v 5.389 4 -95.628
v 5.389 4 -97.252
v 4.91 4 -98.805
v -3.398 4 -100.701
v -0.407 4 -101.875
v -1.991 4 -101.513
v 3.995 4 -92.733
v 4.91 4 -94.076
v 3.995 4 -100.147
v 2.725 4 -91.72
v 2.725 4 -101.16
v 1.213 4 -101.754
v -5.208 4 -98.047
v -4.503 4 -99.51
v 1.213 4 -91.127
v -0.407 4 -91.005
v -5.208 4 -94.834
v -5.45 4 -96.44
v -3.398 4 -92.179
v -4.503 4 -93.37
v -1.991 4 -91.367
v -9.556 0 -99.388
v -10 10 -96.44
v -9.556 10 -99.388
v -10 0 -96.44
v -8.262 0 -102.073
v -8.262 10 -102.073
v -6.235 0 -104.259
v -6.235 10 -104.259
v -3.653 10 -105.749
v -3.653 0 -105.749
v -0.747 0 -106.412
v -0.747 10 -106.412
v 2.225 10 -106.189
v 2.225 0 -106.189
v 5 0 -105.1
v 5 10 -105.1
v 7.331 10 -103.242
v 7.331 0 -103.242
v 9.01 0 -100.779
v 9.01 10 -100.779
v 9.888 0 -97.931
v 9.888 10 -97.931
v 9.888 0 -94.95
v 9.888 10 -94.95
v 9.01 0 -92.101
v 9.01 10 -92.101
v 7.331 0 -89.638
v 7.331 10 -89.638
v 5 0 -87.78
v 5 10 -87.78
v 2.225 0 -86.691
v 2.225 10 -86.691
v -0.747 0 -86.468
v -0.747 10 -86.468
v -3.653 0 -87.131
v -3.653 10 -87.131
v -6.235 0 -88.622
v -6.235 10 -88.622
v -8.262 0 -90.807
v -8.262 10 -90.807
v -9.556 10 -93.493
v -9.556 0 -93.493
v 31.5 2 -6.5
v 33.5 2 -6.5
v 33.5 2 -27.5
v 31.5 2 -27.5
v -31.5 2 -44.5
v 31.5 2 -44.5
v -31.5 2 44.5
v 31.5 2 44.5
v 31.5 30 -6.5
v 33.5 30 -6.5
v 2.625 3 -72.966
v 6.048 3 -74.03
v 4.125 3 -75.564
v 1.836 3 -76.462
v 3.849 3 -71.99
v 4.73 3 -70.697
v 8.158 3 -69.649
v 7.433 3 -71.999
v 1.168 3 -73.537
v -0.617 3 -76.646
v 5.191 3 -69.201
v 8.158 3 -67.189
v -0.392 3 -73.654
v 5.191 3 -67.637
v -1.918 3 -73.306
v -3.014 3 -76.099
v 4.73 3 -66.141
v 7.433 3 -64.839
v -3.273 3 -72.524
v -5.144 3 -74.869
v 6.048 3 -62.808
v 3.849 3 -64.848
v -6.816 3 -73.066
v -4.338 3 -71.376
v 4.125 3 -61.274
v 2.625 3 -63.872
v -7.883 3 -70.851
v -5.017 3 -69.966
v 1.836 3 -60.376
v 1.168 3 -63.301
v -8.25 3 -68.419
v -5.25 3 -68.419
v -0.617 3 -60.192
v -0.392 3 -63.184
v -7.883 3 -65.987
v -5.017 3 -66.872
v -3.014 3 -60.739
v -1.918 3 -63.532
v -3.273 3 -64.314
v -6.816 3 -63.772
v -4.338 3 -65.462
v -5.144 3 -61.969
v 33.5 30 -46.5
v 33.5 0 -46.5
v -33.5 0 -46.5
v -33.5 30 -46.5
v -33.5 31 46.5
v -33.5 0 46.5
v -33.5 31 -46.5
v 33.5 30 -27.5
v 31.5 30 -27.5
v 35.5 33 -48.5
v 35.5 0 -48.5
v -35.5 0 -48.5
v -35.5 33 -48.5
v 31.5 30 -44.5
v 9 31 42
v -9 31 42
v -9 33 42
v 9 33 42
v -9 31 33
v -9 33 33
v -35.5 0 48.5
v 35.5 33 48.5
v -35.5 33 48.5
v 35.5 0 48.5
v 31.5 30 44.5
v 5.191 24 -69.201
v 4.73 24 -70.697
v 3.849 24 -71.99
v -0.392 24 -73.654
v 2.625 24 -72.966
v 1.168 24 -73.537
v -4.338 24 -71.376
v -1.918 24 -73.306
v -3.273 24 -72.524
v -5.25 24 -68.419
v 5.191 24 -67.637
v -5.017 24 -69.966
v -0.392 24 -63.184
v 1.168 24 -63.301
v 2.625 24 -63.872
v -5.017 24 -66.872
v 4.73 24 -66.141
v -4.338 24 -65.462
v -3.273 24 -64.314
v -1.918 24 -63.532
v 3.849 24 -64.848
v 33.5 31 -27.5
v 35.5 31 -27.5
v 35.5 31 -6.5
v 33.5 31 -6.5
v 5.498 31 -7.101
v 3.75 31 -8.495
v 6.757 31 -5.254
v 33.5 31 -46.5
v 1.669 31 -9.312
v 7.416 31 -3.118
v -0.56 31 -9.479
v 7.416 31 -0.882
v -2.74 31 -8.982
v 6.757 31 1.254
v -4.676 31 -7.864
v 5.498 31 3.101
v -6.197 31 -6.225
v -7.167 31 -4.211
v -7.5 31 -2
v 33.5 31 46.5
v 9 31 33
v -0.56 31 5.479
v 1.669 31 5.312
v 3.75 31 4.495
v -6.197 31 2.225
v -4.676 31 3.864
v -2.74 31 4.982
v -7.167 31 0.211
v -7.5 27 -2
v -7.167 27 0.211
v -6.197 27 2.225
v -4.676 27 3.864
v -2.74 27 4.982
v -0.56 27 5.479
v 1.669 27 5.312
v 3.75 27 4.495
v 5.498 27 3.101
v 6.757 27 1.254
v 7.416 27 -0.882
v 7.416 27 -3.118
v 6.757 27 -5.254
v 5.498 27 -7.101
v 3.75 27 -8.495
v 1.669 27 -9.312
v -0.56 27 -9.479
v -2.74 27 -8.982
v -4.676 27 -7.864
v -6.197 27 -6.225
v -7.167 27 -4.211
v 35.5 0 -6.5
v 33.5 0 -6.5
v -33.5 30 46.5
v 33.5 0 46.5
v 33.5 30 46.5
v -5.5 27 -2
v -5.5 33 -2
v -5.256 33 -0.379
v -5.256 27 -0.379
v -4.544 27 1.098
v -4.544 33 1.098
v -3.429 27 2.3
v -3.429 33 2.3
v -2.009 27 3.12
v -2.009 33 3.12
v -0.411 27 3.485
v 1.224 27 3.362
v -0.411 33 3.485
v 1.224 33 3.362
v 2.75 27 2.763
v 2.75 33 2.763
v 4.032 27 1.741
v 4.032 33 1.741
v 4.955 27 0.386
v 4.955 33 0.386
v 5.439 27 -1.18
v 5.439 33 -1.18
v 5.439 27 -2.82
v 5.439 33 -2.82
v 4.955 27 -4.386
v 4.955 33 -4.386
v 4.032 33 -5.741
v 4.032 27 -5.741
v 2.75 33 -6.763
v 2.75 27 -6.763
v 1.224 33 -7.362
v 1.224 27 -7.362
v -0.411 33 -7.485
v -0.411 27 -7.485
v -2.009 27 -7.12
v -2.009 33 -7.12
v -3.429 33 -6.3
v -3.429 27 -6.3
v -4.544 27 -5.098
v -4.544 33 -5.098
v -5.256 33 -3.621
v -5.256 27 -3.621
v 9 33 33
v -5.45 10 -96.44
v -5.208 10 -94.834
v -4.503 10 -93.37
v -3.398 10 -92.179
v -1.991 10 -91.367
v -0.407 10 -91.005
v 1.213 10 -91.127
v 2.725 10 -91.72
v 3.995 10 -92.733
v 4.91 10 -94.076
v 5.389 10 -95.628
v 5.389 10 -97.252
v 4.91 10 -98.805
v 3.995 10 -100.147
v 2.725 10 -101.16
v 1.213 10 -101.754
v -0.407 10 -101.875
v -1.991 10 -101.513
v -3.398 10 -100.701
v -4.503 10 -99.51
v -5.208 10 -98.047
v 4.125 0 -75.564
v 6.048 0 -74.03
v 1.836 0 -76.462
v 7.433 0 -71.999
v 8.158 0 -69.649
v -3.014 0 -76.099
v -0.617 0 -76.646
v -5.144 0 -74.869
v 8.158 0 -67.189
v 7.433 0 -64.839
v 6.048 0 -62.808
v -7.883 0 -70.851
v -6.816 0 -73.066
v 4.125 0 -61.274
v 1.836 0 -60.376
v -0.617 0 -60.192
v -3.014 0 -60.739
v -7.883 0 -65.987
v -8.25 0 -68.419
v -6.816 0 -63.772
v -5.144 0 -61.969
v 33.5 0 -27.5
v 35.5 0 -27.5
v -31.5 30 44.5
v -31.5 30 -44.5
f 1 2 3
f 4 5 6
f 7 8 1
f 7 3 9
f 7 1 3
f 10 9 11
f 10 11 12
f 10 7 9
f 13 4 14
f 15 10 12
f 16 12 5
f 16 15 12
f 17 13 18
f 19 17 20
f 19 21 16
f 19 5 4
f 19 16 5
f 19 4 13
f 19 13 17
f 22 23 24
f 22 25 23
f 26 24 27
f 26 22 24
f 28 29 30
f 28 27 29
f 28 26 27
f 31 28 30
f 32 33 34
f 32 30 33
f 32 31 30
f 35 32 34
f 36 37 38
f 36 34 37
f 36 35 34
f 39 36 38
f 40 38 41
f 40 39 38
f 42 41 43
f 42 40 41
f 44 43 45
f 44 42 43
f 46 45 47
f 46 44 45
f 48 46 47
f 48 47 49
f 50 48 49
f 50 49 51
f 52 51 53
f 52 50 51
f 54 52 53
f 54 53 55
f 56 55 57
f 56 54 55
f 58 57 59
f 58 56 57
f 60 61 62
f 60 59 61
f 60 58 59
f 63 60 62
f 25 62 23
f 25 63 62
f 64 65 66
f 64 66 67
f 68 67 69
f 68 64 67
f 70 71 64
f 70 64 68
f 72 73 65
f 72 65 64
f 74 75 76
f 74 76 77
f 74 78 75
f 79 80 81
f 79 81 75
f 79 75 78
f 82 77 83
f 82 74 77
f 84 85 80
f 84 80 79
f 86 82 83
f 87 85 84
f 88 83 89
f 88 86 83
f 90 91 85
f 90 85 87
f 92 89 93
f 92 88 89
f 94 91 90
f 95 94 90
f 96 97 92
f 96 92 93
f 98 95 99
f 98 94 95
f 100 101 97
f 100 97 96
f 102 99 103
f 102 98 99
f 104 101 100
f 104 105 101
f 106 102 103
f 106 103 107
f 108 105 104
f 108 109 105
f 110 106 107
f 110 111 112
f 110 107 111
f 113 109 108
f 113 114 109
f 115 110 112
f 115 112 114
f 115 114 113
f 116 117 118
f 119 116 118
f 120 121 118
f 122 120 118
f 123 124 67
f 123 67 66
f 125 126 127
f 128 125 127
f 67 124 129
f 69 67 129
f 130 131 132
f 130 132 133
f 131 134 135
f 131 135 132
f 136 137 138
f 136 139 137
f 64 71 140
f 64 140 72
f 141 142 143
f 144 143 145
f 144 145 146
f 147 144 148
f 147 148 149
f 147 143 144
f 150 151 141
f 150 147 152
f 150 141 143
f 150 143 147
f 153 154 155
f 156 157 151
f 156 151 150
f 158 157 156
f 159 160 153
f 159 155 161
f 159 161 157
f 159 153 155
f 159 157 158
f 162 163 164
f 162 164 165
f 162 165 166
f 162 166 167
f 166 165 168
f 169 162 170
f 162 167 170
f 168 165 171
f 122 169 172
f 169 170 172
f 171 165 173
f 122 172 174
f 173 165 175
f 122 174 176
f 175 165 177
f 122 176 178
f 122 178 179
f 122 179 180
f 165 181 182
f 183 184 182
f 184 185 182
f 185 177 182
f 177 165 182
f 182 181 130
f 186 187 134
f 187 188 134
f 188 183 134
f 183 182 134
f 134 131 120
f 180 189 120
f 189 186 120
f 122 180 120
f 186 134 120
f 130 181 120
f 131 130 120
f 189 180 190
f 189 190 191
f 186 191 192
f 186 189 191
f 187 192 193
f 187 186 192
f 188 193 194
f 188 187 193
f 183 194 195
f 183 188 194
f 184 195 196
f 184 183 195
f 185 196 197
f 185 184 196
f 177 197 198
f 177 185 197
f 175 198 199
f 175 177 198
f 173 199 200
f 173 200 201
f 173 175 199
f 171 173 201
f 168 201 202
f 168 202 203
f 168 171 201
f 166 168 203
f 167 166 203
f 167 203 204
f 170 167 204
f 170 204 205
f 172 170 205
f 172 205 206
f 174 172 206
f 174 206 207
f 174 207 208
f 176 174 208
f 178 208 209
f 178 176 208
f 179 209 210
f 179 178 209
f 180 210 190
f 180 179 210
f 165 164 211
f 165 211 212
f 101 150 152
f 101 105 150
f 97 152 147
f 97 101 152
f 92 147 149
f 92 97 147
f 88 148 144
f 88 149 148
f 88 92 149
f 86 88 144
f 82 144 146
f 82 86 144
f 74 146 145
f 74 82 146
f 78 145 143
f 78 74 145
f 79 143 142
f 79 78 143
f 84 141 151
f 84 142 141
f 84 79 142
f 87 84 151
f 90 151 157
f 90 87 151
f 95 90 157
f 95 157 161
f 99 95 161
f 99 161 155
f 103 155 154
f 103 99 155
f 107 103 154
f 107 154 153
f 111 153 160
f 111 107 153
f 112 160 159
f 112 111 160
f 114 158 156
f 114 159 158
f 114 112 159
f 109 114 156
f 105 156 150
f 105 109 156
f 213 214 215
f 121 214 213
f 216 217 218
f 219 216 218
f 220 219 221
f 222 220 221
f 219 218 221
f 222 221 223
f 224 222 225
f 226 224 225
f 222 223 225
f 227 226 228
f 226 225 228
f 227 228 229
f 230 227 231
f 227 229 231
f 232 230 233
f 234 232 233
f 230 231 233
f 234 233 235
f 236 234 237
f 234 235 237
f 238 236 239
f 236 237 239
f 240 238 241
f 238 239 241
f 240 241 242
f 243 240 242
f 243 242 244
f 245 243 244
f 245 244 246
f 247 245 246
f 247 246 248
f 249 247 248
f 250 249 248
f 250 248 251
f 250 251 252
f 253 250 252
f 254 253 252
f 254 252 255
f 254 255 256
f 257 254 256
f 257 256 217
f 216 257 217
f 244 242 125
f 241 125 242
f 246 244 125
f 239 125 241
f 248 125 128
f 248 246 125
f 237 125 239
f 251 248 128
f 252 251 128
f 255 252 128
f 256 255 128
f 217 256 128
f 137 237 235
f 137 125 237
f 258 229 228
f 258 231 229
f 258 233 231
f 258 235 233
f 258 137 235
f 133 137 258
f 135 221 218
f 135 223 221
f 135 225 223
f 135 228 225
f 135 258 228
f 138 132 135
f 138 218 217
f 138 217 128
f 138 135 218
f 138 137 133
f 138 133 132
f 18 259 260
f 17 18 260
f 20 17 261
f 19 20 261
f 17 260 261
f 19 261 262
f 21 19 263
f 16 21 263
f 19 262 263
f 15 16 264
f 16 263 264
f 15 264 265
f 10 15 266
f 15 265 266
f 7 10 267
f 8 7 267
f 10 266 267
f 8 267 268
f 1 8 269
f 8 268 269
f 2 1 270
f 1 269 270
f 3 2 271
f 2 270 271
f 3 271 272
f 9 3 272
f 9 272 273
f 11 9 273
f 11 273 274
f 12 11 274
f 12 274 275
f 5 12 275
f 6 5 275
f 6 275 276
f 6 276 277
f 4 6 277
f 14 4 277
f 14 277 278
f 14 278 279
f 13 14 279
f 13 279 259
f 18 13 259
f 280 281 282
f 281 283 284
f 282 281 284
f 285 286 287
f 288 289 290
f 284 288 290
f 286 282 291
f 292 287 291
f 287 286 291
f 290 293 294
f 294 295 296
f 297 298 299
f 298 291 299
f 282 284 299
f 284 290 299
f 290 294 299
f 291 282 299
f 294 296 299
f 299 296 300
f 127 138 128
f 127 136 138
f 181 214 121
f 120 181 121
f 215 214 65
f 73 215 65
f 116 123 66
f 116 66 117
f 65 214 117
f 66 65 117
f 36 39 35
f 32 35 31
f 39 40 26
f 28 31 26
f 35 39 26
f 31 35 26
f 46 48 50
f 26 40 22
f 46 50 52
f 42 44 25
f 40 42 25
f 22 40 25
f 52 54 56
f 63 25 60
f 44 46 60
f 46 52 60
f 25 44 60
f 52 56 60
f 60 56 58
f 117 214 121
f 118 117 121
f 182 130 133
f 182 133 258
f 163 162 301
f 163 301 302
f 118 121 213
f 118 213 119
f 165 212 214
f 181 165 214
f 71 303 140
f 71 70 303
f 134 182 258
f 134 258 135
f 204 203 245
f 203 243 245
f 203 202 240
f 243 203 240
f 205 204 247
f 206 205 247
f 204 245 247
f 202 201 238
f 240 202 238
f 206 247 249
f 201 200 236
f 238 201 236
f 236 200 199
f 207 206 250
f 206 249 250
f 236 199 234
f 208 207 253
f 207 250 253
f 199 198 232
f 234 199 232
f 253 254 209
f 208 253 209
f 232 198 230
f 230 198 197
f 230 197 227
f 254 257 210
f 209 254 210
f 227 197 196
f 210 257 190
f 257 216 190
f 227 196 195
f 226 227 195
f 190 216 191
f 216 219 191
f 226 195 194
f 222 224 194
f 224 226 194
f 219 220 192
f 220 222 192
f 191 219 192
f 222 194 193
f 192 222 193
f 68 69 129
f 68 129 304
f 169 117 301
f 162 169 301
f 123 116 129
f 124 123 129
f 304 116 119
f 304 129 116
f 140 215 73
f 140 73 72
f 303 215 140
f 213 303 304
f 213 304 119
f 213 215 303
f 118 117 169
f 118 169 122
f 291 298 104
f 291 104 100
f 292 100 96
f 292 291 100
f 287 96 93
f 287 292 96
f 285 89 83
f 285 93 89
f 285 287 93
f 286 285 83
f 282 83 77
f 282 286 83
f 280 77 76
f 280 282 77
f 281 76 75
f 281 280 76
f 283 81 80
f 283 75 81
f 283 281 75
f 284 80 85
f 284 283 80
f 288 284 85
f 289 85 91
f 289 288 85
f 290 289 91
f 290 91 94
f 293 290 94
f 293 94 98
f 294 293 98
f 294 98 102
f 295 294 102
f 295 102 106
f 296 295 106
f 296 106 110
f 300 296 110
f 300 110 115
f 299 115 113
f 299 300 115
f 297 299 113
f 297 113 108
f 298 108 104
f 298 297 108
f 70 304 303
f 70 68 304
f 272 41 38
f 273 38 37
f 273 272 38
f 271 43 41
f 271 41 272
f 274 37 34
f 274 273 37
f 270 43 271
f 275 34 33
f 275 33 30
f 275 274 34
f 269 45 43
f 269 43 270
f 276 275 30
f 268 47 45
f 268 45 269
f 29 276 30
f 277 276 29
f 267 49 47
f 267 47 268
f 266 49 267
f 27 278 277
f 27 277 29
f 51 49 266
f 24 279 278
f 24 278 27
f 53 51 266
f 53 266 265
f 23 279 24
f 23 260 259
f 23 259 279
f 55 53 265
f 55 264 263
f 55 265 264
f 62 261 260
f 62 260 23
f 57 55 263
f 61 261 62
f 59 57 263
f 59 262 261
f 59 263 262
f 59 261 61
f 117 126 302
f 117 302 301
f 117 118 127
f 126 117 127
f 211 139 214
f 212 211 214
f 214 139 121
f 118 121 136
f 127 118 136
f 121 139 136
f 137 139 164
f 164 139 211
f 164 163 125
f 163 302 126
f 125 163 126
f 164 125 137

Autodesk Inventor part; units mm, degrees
ref_plane "YZ Plane" through (0, 0, 0) normal (1, 0, 0) x (0, 1, 0)
ref_plane "XZ Plane" through (0, 0, 0) normal (0, 1, 0) x (-1, 0, 0)
ref_plane "XY Plane" through (0, 0, 0) normal (0, 0, 1) x (1, 0, 0)
sketch "Bottom_sketch" plane through (0, 0, 0) normal (0, 1, 0) x (-1, 0, 0)
  line L0 (31.5, 44.5) -> (-31.5, 44.5)
  line L1 (-31.5, 44.5) -> (-31.5, -44.5)
  line L2 (-31.5, -44.5) -> (31.5, -44.5)
  line L3 (31.5, -44.5) -> (31.5, 44.5)
  line L4 (31.5, 44.5) -> (33.5, 44.5)
  line L5 (33.5, 44.5) -> (33.5, -44.5)
  line L6 (33.5, -44.5) -> (31.5, -44.5)
  line L7 (31.5, -44.5) -> (31.5, 44.5)
  line L8 (-31.5, 44.5) -> (-33.5, 44.5)
  line L9 (-33.5, 44.5) -> (-33.5, -44.5)
  line L10 (-33.5, -44.5) -> (-31.5, -44.5)
  line L11 (-31.5, -44.5) -> (-31.5, 44.5)
  line L12 (33.5, 44.5) -> (-33.5, 44.5)
  line L13 (-33.5, 44.5) -> (-33.5, 46.5)
  line L14 (-33.5, 46.5) -> (33.5, 46.5)
  line L15 (33.5, 46.5) -> (33.5, 44.5)
  line L16 (33.5, -44.5) -> (-33.5, -44.5)
  line L17 (-33.5, -44.5) -> (-33.5, -46.5)
  line L18 (-33.5, -46.5) -> (33.5, -46.5)
  line L19 (33.5, -46.5) -> (33.5, -44.5)
  line L20 (33.5, 46.5) -> (35.5, 46.5)
  line L21 (35.5, 46.5) -> (35.5, -46.5)
  line L22 (35.5, -46.5) -> (33.5, -46.5)
  line L23 (33.5, -46.5) -> (33.5, 46.5)
  line L24 (-33.5, 46.5) -> (-35.5, 46.5)
  line L25 (-35.5, 46.5) -> (-35.5, -46.5)
  line L26 (-35.5, -46.5) -> (-33.5, -46.5)
  line L27 (-33.5, -46.5) -> (-33.5, 46.5)
  line L28 (35.5, 46.5) -> (-35.5, 46.5)
  line L29 (-35.5, 46.5) -> (-35.5, 48.5)
  line L30 (-35.5, 48.5) -> (35.5, 48.5)
  line L31 (35.5, 48.5) -> (35.5, 46.5)
  line L32 (35.5, -46.5) -> (-35.5, -46.5)
  line L33 (-35.5, -46.5) -> (-35.5, -48.5)
  line L34 (-35.5, -48.5) -> (35.5, -48.5)
  line L35 (35.5, -48.5) -> (35.5, -46.5)
  line L36 (-31.5, -27.5) -> (-35.5, -27.5)
  line L37 (-35.5, -27.5) -> (-35.5, -6.5)
  line L38 (-35.5, -6.5) -> (-31.5, -6.5)
  line L39 (-31.5, -6.5) -> (-31.5, -27.5)
  line L40 (9, 48.5) -> (-9, 48.5)
  line L41 (-9, 48.5) -> (-9, 44.5)
  line L42 (-9, 44.5) -> (9, 44.5)
  line L43 (9, 44.5) -> (9, 48.5)
  circle A0 centre (0, -2) radius 5.5
  circle A1 centre (0, -2) radius 7.5
  line L44 (9, 42) -> (-9, 42)
  line L45 (-9, 42) -> (-9, 33)
  line L46 (-9, 33) -> (9, 33)
  line L47 (9, 33) -> (9, 42)
  circle A2 centre (0, -68.419) radius 5.25
  circle A3 centre (0, -68.419) radius 8.25
  circle A4 centre (0, -96.4402) radius 10
  circle A5 centre (0, -96.4402) radius 5.45
  point P0 (0, 0)
  point P1 (-33.5, -44.5)
  point P2 (-31.5, -6.5)
  point P3 (-33.5, -6.5)
  point P4 (-33.5, -27.5)
  point P5 (-31.5, -27.5)
  point P6 (-35.5, -27.5)
  point P7 (0, 46.5)
  point P8 (-9, 48.5)
  point P9 (-9, 44.5)
  point P10 (9, 46.5)
  point P11 (-9, 46.5)
  dimension "width" = 89
  dimension "height" = 63
  dimension "d6" = 31.5
  dimension "d7" = 44.5
  dimension "thickness" = 2
  dimension "d9" = 2
  dimension "d10" = 2
  dimension "d11" = 2
  dimension "d16" = 2
  dimension "d17" = 2
  dimension "d18" = 2
  dimension "d19" = 2
  dimension "lora_width" = 21
  dimension "d25" = 17
  dimension "d28" = 18
  dimension "d29" = 9
  dimension "d39" = 2
  dimension "d40" = 11
  dimension "d42" = 15
  dimension "d45" = 2.5
  dimension "d46" = 9
  dimension "d49" = 10.5
  dimension "d53" = 31.5
  dimension "d54" = 31.5
  dimension "d55" = 0
  dimension "d56" = 16.5
  dimension "d59" = 20
  dimension "d62" = 10.9
extrude "Bottom" add sketch "Bottom_sketch" along normal blind 2 contours L3 L2 L1 L0 | A0 | A1 | L47 L46 L45 L44
extrude "Side_Inside" add sketch "Bottom_sketch" along normal blind 30 contours L4 L5 L6 L3 | L0 L43 L14 L15 L4 | L0 L41 L14 L43 | L6 L19 L18 L17 L10 L2 | L0 L8 L13 L14 L41 | L10 L9 L36 L1 | L1 L38 L9 L8 | L36 L9 L38 L1
extrude "Side_Outside" add sketch "Bottom_sketch" along normal blind 31 separate body contours L15 L20 L21 L22 L19 L5 | L43 L30 L31 L20 L14 | L14 L41 L30 L43 | L14 L24 L29 L30 L41 | L17 L26 L25 L36 L9 | L22 L35 L34 L33 L26 L18 | L9 L38 L25 L24 L13 | L36 L25 L38 L9
extrude "Top" add sketch "Bottom_sketch" along normal blind 2 from surface at 31 contours L3 L2 L1 L0 | L4 L5 L6 L3 | L0 L43 L14 L15 L4 | L0 L41 L14 L43 | L6 L19 L18 L17 L10 L2 | L15 L20 L21 L22 L19 L5 | L0 L8 L13 L14 L41 | L43 L30 L31 L20 L14 | L14 L41 L30 L43 | L10 L9 L36 L1 | L1 L38 L9 L8 | L14 L24 L29 L30 L41 | L36 L9 L38 L1 | L17 L26 L25 L36 L9 | L22 L35 L34 L33 L26 L18 | L9 L38 L25 L24 L13 | L36 L25 L38 L9 | A0 | A1 | L47 L46 L45 L44 bodies 2
extrude "Lora_Hole" cut sketch "Bottom_sketch" along normal blind 29 from surface at 2 contours L36 L9 L38 L1 | L36 L25 L38 L9 bodies 1 2
extrude "TTL_Hole" [suppressed]
extrude "TTL_Outside" [suppressed]
extrude "Button_Hole" cut sketch "Bottom_sketch" against normal blind 6 from surface at 33 contours A0 bodies 1 2
extrude "Lora_Outside" cut sketch "Bottom_sketch" along normal blind 3 contours L36 L25 L38 L9 bodies 1 2
extrude "Button_slide" add sketch "Bottom_sketch" against normal blind 4 from surface at 31 contours A1 bodies 2
extrude "TTL_Hole_v2" cut sketch "Bottom_sketch" along normal blind 6 from surface at 31 contours L47 L46 L45 L44 bodies 2
extrude "Button_Piece" add sketch "Bottom_sketch" along normal blind 24 separate body contours A2
extrude "Button_Bottom" add sketch "Bottom_sketch" along normal blind 3 contours A3 bodies 3
extrude "Button_Mushroom" add sketch "Bottom_sketch" along normal blind 10 contours A4 | A5 bodies 3
extrude "Mushroom_Inside" cut sketch "Bottom_sketch" against normal blind 6 from surface at 10 contours A5 bodies 3
equation "\"d6\" = 0.5 * height"
equation "\"d7\" = 0.5 * width"
equation "\"d9\" = thickness"
equation "\"d10\" = thickness"
equation "\"d11\" = thickness"
equation "\"d16\" = thickness"
equation "\"d17\" = thickness"
equation "\"d18\" = thickness"
equation "\"d19\" = thickness"
equation "\"d29\" = 0.5 * d28"
equation "\"d42\" = d40 + 2 * thickness"
equation "\"d53\" = 0.5 * height"
equation "\"d54\" = d53"
equation "\"d12\" = thickness"
equation "\"d22\" = thickness"
equation "\"d30\" = depth - 1.5 * thickness"
equation "\"d35\" = 1.5 * thickness"
equation "\"d33\" = 3 * thickness"
equation "\"d37\" = 1.5 * thickness"
equation "\"d47\" = 3 * thickness"
equation "\"d50\" = 0.8 * depth"
equation "\"depth\" = 30"
properties part number "REceiver"
